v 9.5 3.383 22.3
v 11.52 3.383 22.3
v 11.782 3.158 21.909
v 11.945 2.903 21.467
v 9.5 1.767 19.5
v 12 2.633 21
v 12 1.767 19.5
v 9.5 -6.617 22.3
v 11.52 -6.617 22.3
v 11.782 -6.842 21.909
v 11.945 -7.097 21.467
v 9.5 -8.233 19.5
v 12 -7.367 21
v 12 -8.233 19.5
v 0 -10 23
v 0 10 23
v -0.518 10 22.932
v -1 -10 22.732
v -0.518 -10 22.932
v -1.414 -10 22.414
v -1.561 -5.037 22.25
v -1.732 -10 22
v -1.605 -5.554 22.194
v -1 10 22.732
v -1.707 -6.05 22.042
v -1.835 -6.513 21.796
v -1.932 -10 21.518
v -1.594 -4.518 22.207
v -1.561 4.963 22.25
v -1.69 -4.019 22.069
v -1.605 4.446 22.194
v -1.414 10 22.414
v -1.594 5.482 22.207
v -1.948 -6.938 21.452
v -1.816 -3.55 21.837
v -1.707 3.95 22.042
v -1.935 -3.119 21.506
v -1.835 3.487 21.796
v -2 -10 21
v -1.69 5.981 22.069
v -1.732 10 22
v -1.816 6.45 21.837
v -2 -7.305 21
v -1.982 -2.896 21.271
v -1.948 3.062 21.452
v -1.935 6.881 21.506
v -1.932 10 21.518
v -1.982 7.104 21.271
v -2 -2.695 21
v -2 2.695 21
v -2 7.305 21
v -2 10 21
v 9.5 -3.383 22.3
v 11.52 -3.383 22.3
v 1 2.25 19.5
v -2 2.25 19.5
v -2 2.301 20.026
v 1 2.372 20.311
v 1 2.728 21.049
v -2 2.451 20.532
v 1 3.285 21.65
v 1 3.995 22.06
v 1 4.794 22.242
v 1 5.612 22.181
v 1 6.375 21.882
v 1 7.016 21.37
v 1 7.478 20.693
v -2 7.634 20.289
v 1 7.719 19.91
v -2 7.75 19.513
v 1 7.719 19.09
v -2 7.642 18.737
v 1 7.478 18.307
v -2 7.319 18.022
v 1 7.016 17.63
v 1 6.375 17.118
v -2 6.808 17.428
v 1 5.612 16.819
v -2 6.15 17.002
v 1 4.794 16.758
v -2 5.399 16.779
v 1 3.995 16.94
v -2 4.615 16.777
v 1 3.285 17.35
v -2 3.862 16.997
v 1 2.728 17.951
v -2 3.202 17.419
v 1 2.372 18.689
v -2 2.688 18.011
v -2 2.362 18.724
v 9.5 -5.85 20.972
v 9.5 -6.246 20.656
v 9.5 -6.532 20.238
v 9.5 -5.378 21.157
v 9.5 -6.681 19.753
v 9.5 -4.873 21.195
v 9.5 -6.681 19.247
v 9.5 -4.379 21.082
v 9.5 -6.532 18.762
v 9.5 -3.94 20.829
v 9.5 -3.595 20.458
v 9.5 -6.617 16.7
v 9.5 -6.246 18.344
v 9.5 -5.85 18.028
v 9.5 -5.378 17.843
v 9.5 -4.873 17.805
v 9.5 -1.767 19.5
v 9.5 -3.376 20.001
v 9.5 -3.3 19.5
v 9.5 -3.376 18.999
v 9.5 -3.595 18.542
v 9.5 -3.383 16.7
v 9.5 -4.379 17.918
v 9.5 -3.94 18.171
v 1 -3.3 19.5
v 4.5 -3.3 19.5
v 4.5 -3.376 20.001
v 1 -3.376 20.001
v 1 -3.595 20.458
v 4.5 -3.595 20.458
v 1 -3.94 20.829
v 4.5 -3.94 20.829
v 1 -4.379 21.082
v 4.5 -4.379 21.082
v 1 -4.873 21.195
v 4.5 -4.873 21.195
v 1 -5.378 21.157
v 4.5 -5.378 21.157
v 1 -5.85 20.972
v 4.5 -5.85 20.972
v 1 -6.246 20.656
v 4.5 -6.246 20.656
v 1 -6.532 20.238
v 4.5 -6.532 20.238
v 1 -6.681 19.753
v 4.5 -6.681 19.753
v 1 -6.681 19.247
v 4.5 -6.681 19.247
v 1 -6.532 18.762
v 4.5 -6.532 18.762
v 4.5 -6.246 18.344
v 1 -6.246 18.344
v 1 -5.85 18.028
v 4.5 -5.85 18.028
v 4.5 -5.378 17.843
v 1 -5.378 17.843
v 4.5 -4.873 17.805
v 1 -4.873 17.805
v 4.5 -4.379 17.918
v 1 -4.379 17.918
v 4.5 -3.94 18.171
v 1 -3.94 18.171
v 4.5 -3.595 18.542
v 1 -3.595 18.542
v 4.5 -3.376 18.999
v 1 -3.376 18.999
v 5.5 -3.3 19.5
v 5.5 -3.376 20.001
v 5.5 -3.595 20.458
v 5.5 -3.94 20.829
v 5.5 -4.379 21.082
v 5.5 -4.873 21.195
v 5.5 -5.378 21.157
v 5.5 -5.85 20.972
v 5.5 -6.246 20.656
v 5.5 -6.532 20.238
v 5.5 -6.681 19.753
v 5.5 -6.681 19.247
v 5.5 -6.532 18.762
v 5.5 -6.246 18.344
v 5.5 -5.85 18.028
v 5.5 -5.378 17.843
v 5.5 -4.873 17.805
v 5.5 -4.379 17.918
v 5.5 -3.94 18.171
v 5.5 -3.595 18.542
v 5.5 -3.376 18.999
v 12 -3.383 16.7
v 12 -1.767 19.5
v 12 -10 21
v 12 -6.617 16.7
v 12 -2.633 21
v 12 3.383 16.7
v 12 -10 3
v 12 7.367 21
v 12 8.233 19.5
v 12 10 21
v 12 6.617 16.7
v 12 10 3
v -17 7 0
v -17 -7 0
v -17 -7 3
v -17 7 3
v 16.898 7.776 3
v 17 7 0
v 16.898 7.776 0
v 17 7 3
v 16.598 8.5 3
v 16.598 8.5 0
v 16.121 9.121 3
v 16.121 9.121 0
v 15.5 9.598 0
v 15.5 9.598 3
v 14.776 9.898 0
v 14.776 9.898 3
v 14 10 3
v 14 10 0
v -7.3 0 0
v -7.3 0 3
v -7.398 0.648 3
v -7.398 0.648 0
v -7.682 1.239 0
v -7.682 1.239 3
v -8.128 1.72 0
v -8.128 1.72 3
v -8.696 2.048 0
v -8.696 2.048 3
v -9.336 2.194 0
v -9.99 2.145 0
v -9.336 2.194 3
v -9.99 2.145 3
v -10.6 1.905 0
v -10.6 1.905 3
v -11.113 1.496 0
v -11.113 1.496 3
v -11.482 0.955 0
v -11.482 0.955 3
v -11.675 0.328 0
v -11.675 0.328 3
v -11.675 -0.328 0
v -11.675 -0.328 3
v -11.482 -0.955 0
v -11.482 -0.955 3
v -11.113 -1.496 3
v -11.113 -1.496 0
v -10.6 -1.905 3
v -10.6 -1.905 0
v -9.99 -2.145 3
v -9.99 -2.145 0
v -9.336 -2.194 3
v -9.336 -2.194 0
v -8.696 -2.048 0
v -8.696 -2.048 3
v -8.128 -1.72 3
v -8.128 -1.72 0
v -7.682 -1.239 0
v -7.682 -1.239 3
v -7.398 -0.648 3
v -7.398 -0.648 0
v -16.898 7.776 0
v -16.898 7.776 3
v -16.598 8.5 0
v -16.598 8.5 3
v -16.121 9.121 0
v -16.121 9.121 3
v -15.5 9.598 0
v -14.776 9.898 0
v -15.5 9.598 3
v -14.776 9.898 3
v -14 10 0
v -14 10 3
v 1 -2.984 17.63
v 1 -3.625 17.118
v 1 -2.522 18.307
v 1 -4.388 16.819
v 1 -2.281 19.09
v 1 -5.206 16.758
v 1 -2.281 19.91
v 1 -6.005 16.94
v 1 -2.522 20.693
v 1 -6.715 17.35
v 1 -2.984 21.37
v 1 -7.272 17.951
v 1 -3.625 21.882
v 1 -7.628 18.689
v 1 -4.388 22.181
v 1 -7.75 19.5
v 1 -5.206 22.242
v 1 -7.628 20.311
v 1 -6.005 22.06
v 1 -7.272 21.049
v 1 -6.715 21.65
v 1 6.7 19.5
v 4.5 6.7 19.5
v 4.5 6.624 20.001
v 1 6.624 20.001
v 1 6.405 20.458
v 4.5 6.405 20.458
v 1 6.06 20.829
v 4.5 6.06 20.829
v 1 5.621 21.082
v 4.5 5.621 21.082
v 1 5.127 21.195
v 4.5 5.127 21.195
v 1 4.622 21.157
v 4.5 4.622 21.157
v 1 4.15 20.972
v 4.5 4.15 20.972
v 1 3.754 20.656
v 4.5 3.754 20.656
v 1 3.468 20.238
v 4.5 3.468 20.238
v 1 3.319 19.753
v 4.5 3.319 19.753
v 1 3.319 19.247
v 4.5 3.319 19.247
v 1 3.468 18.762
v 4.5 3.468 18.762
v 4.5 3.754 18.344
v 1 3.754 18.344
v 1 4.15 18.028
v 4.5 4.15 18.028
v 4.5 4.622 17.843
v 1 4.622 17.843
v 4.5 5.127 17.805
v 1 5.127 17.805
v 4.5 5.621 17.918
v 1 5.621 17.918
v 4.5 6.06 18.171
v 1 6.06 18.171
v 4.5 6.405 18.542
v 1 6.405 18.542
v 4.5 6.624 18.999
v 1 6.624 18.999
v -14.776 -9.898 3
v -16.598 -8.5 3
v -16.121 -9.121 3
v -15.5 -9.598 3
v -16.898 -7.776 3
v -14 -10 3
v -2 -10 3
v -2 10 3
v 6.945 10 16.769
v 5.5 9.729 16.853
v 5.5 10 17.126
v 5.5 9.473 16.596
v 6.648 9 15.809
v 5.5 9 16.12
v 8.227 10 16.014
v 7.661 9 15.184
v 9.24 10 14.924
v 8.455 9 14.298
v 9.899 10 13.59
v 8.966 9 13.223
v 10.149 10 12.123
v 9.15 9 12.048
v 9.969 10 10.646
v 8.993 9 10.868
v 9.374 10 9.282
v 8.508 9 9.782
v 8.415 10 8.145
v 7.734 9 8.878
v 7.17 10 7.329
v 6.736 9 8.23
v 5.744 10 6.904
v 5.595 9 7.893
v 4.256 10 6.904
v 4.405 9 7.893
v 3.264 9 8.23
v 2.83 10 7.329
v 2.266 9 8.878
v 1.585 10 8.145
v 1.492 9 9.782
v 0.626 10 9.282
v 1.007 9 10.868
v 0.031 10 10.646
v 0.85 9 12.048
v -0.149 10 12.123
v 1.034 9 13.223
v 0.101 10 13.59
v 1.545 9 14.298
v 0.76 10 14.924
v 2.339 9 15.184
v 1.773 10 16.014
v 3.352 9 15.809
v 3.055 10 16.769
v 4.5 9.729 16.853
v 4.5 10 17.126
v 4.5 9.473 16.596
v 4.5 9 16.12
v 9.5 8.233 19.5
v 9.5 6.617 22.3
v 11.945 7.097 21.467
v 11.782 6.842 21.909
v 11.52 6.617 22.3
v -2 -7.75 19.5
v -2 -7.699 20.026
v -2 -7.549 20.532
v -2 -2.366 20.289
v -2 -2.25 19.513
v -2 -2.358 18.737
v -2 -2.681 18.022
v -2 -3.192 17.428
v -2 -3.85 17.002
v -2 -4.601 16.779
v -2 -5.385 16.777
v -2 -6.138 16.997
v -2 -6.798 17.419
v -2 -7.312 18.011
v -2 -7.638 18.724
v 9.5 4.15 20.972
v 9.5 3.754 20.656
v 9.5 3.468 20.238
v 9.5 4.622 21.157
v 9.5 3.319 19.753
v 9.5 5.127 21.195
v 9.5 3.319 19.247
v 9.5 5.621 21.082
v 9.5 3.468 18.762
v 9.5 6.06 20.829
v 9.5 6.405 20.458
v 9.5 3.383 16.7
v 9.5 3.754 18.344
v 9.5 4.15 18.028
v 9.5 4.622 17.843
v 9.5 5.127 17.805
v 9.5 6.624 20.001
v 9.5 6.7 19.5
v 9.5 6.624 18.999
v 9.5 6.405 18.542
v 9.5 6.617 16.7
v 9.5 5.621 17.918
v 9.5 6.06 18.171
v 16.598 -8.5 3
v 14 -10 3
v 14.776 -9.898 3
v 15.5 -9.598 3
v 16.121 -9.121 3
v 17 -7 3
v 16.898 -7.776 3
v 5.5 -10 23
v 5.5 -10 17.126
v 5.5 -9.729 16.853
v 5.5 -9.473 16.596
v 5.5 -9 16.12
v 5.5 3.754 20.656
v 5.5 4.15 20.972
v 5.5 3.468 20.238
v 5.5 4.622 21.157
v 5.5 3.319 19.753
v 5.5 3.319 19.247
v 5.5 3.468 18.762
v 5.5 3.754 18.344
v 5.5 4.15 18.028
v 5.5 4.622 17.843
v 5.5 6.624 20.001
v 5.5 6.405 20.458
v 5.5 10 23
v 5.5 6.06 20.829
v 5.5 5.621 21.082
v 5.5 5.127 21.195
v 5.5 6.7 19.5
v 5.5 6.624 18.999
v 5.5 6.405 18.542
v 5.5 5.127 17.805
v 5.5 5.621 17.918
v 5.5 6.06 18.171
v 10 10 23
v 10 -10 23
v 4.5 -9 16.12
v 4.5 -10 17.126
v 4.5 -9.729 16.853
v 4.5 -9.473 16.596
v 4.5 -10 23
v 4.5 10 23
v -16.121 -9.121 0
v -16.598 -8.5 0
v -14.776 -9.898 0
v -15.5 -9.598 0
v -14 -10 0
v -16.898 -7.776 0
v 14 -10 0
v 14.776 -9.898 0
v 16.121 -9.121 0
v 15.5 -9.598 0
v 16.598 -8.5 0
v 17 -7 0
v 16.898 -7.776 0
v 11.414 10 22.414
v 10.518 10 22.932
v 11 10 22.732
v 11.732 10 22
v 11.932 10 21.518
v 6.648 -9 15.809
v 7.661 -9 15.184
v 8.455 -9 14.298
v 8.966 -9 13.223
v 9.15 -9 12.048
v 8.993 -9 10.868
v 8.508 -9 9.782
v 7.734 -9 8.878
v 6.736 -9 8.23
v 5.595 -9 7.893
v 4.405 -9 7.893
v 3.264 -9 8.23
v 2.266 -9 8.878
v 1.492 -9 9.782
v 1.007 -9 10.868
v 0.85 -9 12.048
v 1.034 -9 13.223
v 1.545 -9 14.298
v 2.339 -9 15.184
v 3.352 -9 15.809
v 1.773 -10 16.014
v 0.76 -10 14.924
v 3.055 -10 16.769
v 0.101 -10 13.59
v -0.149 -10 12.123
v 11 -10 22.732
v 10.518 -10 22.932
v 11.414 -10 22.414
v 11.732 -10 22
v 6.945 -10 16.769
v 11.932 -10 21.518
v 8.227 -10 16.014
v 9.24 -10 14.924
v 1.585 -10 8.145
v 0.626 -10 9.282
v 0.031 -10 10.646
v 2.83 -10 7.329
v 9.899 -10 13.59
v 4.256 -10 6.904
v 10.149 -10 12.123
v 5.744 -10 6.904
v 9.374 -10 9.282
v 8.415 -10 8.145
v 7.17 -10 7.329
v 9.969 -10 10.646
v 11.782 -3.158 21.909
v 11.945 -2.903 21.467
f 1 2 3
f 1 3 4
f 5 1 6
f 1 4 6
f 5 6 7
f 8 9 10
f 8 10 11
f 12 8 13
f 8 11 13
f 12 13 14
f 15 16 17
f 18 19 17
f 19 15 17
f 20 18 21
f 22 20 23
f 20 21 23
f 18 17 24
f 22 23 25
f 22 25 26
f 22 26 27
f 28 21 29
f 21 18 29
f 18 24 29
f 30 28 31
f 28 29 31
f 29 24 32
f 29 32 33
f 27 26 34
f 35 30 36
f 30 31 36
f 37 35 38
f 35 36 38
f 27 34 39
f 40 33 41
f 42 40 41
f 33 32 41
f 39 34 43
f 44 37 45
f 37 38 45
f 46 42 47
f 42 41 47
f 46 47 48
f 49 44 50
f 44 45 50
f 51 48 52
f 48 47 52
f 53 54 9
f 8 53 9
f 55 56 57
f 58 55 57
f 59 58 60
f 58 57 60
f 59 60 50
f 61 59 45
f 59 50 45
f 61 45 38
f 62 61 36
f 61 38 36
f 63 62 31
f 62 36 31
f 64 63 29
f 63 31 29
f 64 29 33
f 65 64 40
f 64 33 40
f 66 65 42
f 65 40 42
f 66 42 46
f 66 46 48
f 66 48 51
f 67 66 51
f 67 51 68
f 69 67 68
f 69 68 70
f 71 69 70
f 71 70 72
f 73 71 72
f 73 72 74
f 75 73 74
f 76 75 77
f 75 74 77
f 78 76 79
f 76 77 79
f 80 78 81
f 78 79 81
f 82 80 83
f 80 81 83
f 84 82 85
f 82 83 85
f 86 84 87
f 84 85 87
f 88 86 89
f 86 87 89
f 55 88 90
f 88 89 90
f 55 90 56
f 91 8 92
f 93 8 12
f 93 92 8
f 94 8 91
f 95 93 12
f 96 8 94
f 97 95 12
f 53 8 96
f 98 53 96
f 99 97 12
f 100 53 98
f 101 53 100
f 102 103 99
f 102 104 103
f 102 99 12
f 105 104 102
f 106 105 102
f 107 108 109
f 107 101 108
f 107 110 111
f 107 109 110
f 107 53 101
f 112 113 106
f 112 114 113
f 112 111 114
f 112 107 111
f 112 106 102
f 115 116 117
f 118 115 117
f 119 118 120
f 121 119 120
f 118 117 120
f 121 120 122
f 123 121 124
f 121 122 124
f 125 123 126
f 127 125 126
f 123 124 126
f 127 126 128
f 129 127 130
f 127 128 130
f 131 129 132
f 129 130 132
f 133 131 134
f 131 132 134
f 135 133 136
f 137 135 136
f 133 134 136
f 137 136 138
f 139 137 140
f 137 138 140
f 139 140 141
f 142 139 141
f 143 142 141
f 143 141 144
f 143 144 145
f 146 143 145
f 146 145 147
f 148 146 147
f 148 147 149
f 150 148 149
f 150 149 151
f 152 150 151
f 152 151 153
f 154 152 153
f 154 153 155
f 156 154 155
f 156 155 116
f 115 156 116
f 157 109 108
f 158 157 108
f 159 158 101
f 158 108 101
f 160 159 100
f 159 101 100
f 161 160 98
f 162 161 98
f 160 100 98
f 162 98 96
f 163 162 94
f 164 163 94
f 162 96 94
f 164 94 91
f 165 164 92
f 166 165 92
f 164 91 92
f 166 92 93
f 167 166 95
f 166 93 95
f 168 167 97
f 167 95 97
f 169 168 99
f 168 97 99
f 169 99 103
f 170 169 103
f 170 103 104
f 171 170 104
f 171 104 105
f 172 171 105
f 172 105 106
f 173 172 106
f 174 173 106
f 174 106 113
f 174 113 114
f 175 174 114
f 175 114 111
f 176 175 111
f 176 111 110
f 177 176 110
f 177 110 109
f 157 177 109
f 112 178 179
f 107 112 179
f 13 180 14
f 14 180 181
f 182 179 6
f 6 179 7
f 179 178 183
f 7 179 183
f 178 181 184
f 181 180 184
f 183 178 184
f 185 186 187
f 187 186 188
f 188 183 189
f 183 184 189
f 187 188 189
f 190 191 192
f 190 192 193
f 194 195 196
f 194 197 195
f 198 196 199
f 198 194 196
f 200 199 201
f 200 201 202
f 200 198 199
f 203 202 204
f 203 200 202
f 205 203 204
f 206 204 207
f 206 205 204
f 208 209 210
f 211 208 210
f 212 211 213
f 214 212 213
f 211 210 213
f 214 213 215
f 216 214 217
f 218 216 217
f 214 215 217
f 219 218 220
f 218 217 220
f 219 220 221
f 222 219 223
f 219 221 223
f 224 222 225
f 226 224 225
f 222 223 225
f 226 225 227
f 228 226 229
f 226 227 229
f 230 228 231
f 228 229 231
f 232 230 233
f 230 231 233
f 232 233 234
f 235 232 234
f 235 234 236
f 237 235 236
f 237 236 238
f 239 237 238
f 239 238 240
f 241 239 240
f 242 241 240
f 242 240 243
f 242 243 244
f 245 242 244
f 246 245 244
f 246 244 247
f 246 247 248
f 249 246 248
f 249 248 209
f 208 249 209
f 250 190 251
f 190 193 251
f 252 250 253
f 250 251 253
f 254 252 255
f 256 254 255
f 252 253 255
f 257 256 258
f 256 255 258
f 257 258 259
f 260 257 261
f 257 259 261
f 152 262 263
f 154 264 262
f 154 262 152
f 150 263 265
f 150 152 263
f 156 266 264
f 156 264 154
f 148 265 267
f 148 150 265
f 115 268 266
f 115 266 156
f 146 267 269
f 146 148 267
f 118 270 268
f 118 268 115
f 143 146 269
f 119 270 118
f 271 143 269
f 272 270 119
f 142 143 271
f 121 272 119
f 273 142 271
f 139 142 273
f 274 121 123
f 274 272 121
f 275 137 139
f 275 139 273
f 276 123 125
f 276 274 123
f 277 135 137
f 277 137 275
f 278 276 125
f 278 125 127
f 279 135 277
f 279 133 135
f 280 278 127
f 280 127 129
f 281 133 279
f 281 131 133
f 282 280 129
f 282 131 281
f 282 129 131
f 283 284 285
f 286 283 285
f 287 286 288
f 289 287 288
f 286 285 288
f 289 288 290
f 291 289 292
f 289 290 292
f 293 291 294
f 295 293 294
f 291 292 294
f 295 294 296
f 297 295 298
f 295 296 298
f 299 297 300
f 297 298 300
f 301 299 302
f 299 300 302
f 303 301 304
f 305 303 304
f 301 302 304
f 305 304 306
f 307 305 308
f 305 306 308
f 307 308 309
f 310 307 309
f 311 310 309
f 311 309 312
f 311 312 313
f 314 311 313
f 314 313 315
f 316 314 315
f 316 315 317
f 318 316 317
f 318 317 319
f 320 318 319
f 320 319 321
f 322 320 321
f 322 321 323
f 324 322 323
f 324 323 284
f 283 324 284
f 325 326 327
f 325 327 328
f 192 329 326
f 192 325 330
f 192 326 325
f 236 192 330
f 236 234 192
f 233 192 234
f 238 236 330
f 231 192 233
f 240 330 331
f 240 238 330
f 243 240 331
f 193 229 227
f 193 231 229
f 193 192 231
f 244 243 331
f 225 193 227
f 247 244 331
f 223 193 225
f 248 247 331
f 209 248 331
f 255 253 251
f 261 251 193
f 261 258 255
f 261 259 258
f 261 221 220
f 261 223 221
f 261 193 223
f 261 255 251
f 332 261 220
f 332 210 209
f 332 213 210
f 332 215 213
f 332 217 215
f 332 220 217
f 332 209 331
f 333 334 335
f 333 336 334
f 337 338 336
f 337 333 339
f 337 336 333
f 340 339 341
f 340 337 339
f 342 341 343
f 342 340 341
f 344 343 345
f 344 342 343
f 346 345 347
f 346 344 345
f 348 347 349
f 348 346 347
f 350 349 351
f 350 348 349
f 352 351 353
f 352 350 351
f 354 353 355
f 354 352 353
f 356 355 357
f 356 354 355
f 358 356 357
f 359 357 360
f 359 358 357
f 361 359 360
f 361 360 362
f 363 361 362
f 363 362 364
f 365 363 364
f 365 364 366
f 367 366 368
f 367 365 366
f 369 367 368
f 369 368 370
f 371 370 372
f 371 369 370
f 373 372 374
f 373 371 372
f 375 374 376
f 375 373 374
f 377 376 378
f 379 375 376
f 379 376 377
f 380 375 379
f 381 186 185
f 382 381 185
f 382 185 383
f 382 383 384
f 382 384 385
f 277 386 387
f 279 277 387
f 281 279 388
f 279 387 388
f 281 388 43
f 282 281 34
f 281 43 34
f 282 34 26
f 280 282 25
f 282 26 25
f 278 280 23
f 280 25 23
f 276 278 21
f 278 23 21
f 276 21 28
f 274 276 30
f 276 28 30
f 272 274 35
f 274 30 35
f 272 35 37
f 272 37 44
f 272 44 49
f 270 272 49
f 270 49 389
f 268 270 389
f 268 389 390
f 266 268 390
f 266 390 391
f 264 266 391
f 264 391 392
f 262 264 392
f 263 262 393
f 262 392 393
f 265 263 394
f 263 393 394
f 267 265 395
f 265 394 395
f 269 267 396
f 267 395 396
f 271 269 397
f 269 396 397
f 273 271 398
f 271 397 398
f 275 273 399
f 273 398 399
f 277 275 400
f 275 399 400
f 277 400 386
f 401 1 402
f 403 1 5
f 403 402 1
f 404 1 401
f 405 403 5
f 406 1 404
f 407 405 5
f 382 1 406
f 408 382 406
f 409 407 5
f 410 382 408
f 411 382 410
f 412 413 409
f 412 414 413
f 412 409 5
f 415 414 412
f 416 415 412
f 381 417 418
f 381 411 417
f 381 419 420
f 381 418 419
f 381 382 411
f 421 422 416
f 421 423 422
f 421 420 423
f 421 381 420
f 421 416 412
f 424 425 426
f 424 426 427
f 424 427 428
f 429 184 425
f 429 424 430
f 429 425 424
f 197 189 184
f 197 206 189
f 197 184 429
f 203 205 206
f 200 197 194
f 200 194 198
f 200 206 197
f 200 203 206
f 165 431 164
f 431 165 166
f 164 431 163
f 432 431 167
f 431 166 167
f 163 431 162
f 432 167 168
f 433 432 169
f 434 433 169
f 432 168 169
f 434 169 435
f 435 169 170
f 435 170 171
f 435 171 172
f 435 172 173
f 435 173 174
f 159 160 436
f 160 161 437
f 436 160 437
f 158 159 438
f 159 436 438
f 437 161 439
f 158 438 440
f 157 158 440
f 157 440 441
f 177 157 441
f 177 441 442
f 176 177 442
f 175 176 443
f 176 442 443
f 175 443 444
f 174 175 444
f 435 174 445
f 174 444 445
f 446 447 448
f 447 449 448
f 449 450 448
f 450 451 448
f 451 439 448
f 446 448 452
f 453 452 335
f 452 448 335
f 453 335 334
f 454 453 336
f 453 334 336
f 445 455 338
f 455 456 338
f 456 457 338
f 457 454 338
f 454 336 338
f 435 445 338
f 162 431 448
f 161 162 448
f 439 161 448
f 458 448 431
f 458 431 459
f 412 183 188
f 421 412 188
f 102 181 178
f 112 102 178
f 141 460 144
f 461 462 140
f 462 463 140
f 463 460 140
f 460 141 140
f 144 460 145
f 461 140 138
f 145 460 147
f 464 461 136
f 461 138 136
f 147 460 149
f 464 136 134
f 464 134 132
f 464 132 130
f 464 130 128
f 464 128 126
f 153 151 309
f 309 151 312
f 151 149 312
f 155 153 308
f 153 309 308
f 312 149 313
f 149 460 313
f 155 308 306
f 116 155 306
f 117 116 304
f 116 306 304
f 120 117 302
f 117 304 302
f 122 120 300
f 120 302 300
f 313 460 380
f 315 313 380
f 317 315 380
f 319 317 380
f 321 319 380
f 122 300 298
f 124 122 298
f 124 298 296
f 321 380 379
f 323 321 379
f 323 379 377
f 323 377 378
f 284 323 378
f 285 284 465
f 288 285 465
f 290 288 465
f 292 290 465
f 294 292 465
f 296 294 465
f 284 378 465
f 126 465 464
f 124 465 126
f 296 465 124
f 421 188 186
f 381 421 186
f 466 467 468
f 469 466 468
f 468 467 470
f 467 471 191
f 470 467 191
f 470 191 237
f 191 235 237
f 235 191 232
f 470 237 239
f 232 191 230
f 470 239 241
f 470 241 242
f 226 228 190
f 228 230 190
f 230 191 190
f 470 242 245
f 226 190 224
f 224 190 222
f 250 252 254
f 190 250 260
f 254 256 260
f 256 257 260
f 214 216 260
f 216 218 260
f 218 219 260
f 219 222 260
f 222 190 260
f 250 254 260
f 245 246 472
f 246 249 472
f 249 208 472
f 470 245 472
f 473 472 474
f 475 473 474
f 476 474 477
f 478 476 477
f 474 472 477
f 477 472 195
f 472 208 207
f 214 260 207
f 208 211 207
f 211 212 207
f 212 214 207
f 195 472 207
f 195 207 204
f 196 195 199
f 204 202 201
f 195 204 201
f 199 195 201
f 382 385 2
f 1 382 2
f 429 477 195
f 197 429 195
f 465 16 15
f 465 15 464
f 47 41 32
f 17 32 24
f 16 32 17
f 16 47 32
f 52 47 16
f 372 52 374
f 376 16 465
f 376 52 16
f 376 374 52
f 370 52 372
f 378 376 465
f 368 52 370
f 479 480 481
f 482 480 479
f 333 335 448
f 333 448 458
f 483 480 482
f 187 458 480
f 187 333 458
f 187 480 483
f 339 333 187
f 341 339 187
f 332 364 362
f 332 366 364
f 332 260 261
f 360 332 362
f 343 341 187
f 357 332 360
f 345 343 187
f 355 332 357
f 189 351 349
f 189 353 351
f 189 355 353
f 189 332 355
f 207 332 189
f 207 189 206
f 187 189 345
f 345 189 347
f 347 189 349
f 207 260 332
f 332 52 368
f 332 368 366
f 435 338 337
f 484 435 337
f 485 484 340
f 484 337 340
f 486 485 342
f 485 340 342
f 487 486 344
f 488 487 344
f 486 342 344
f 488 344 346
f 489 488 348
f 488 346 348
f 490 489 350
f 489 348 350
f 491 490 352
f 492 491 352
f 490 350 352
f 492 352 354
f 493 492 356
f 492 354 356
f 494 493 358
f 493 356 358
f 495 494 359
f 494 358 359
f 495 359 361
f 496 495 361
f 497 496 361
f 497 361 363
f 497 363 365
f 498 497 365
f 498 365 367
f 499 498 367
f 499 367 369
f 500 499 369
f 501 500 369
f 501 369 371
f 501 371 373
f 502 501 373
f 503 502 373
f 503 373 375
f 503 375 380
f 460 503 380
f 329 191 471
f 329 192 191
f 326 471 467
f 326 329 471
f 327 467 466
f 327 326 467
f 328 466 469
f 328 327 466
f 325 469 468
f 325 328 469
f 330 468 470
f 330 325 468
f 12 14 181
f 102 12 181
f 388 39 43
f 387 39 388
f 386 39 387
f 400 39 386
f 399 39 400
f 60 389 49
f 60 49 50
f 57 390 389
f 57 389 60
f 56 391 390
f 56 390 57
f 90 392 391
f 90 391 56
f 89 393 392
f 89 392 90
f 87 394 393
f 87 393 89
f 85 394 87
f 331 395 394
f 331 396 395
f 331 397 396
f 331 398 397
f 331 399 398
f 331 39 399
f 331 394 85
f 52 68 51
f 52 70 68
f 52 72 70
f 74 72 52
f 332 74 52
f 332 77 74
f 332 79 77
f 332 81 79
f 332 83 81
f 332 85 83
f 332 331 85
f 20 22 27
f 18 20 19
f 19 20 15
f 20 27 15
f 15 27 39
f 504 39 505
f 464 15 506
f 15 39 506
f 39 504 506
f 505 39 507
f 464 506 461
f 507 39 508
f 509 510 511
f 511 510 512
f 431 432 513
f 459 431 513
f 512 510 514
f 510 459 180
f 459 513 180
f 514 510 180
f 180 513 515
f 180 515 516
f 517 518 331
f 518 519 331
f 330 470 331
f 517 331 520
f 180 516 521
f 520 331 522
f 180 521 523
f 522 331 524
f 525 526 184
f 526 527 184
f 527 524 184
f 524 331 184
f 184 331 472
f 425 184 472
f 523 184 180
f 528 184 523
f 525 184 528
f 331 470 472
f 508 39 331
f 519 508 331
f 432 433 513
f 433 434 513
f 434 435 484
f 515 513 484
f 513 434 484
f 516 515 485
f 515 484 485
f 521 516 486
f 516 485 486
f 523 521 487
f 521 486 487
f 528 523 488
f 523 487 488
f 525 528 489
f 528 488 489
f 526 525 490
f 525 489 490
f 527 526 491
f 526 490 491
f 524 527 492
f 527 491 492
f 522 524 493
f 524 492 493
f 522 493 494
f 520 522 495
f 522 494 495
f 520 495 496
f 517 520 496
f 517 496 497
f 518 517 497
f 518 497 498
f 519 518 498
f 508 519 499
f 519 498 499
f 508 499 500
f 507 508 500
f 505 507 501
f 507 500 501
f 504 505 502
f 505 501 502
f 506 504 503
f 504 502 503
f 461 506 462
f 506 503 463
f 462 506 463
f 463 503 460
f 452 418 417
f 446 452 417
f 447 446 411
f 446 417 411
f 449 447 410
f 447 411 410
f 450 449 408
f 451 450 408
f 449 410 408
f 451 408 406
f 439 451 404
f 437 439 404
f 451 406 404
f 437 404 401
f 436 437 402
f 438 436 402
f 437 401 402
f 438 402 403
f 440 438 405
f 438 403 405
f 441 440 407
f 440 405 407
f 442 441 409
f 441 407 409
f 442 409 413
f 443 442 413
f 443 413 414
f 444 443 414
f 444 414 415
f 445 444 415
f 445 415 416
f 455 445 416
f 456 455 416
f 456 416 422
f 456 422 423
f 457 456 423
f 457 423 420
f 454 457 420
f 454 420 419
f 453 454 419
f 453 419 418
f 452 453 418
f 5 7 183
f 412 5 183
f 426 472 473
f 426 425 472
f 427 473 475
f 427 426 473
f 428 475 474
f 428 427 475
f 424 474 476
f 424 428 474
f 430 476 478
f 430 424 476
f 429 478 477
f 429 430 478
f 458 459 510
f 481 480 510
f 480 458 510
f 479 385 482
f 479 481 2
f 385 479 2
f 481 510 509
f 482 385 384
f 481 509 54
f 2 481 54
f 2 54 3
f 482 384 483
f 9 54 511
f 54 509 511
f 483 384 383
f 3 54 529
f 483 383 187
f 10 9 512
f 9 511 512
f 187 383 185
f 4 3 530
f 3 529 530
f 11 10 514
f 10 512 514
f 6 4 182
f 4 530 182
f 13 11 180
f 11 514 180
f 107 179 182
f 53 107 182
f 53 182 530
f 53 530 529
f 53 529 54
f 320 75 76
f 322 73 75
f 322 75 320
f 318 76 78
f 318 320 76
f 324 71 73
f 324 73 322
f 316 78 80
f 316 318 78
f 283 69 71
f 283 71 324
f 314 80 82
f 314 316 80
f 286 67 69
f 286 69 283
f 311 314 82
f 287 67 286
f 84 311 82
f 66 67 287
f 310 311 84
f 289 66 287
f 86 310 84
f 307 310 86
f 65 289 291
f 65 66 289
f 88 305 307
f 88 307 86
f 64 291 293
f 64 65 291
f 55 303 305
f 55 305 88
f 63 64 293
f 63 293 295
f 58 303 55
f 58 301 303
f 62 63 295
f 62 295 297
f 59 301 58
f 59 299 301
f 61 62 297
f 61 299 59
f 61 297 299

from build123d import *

# Parameters (mm, degrees)
SKETCH1_W           = 34
SKETCH1_H           = 20
BOSS_EXTRUDE1_DEPTH = 3
FILLET1_R           = 3
SKETCH2_W           = 14
SKETCH2_H           = 20
BOSS_EXTRUDE2_DEPTH = 20
CUT_EXTRUDE1_DEPTH  = 35.899856733
CHAMFER1_SIZE       = 1
SKETCH4_R           = 2.2
CUT_EXTRUDE2_DEPTH  = 29.08914381
SKETCH5_R           = 1.7
CUT_EXTRUDE3_DEPTH  = 39.340579025
FILLET2_R           = 2
CUT_EXTRUDE4_DEPTH  = 2.5
SKETCH7_R           = 2.75
CUT_EXTRUDE5_DEPTH  = 3


with BuildPart() as part:
    # Sketch1 → Boss-Extrude1 (new body)
    with BuildSketch(Plane.XY):
        Rectangle(SKETCH1_W, SKETCH1_H)
    extrude(amount=BOSS_EXTRUDE1_DEPTH)

    # Fillet1
    fillet1_edges = [part.edges().sort_by_distance(p)[0] for p in [
        (17, -10, 1.5),
        (-17, -10, 1.5),
        (-17, 10, 1.5),
        (17, 10, 1.5),
    ]]
    fillet(fillet1_edges, radius=FILLET1_R)

    # Sketch2 → Boss-Extrude2 (add)
    with BuildSketch(Plane.XY.offset(3)):
        with Locations((5, 0)):
            Rectangle(SKETCH2_W, SKETCH2_H)
    extrude(amount=BOSS_EXTRUDE2_DEPTH)

    # Sketch3 → Cut-Extrude1 (cut, through all)
    with BuildSketch(Plane(origin=(0, 10, 0), x_dir=(1, 0, 0), z_dir=(0, 1, 0))):
        with BuildLine():
            Line((4.5, -16.119769411), (4.5, -23))
            Line((4.5, -23), (5.5, -23))
            Line((5.5, -23), (5.5, -16.119769411))
            ThreePointArc((5.5, -16.119769411), (5, -7.85), (4.5, -16.119769411))
        make_face()
    extrude(amount=-CUT_EXTRUDE1_DEPTH, mode=Mode.SUBTRACT)

    # Chamfer1
    chamfer1_edges = [part.edges().sort_by_distance(p)[0] for p in [
        (5, -10, 7.85),
        (5, 10, 7.85),
    ]]
    chamfer(chamfer1_edges, length=CHAMFER1_SIZE)

    # Sketch4 → Cut-Extrude2 (cut, through all)
    with BuildSketch(Plane.XY.offset(3)):
        with Locations((-9.5, 0)):
            Circle(SKETCH4_R)
    extrude(amount=-CUT_EXTRUDE2_DEPTH, mode=Mode.SUBTRACT)

    # Sketch5 → Cut-Extrude3 (cut, through all)
    with BuildSketch(Plane(origin=(12, 0, 0), x_dir=(0, 0, -1), z_dir=(1, 0, 0))):
        with Locations(Location((-19.5, 5, 0), (0, 0, 90))):
            Circle(SKETCH5_R)
        with Locations(Location((-19.5, -5, 0), (0, 0, 90))):
            Circle(SKETCH5_R)
    extrude(amount=-CUT_EXTRUDE3_DEPTH, mode=Mode.SUBTRACT)

    # Fillet2
    # the kernel refuses this fillet: 2 mm, written as the material it takes off along each edge
    with BuildSketch(Plane(origin=(12, -15, 23), x_dir=(-1, 0, 0), z_dir=(0, 1, 0)), Plane(origin=(-2, 15, 23), x_dir=(1, 0, 0), z_dir=(0, -1, 0))) as fillet2_piece_1:
        with BuildLine():
            CenterArc((FILLET2_R, -FILLET2_R), FILLET2_R, 90, 90)
            Line((0, -FILLET2_R), (0, 0))
            Line((0, 0), (FILLET2_R, 0))
        make_face()
    extrude(amount=30, mode=Mode.SUBTRACT)

    # Sketch6 → Cut-Extrude4 (cut)
    with BuildSketch(Plane(origin=(12, 0, 0), x_dir=(0, 0, -1), z_dir=(1, 0, 0))):
        Polygon((-16.7, 3.383419246), (-16.7, 6.616580754), (-19.5, 8.233161507), (-22.3, 6.616580754), (-22.3, 3.383419246), (-19.5, 1.766838493), align=None)
        Polygon((-16.7, -3.383419246), (-19.5, -1.766838493), (-22.3, -3.383419246), (-22.3, -6.616580754), (-19.5, -8.233161507), (-16.7, -6.616580754), align=None)
    extrude(amount=-CUT_EXTRUDE4_DEPTH, mode=Mode.SUBTRACT)

    # Sketch7 → Cut-Extrude5 (cut)
    with BuildSketch(Plane.ZY.offset(2)):
        with Locations(Location((19.5, 5, 0), (0, 0, 270))):
            Circle(SKETCH7_R)
        with Locations(Location((19.5, -5, 0), (0, 0, 270))):
            Circle(SKETCH7_R)
    extrude(amount=-CUT_EXTRUDE5_DEPTH, mode=Mode.SUBTRACT)


solid = part.part
